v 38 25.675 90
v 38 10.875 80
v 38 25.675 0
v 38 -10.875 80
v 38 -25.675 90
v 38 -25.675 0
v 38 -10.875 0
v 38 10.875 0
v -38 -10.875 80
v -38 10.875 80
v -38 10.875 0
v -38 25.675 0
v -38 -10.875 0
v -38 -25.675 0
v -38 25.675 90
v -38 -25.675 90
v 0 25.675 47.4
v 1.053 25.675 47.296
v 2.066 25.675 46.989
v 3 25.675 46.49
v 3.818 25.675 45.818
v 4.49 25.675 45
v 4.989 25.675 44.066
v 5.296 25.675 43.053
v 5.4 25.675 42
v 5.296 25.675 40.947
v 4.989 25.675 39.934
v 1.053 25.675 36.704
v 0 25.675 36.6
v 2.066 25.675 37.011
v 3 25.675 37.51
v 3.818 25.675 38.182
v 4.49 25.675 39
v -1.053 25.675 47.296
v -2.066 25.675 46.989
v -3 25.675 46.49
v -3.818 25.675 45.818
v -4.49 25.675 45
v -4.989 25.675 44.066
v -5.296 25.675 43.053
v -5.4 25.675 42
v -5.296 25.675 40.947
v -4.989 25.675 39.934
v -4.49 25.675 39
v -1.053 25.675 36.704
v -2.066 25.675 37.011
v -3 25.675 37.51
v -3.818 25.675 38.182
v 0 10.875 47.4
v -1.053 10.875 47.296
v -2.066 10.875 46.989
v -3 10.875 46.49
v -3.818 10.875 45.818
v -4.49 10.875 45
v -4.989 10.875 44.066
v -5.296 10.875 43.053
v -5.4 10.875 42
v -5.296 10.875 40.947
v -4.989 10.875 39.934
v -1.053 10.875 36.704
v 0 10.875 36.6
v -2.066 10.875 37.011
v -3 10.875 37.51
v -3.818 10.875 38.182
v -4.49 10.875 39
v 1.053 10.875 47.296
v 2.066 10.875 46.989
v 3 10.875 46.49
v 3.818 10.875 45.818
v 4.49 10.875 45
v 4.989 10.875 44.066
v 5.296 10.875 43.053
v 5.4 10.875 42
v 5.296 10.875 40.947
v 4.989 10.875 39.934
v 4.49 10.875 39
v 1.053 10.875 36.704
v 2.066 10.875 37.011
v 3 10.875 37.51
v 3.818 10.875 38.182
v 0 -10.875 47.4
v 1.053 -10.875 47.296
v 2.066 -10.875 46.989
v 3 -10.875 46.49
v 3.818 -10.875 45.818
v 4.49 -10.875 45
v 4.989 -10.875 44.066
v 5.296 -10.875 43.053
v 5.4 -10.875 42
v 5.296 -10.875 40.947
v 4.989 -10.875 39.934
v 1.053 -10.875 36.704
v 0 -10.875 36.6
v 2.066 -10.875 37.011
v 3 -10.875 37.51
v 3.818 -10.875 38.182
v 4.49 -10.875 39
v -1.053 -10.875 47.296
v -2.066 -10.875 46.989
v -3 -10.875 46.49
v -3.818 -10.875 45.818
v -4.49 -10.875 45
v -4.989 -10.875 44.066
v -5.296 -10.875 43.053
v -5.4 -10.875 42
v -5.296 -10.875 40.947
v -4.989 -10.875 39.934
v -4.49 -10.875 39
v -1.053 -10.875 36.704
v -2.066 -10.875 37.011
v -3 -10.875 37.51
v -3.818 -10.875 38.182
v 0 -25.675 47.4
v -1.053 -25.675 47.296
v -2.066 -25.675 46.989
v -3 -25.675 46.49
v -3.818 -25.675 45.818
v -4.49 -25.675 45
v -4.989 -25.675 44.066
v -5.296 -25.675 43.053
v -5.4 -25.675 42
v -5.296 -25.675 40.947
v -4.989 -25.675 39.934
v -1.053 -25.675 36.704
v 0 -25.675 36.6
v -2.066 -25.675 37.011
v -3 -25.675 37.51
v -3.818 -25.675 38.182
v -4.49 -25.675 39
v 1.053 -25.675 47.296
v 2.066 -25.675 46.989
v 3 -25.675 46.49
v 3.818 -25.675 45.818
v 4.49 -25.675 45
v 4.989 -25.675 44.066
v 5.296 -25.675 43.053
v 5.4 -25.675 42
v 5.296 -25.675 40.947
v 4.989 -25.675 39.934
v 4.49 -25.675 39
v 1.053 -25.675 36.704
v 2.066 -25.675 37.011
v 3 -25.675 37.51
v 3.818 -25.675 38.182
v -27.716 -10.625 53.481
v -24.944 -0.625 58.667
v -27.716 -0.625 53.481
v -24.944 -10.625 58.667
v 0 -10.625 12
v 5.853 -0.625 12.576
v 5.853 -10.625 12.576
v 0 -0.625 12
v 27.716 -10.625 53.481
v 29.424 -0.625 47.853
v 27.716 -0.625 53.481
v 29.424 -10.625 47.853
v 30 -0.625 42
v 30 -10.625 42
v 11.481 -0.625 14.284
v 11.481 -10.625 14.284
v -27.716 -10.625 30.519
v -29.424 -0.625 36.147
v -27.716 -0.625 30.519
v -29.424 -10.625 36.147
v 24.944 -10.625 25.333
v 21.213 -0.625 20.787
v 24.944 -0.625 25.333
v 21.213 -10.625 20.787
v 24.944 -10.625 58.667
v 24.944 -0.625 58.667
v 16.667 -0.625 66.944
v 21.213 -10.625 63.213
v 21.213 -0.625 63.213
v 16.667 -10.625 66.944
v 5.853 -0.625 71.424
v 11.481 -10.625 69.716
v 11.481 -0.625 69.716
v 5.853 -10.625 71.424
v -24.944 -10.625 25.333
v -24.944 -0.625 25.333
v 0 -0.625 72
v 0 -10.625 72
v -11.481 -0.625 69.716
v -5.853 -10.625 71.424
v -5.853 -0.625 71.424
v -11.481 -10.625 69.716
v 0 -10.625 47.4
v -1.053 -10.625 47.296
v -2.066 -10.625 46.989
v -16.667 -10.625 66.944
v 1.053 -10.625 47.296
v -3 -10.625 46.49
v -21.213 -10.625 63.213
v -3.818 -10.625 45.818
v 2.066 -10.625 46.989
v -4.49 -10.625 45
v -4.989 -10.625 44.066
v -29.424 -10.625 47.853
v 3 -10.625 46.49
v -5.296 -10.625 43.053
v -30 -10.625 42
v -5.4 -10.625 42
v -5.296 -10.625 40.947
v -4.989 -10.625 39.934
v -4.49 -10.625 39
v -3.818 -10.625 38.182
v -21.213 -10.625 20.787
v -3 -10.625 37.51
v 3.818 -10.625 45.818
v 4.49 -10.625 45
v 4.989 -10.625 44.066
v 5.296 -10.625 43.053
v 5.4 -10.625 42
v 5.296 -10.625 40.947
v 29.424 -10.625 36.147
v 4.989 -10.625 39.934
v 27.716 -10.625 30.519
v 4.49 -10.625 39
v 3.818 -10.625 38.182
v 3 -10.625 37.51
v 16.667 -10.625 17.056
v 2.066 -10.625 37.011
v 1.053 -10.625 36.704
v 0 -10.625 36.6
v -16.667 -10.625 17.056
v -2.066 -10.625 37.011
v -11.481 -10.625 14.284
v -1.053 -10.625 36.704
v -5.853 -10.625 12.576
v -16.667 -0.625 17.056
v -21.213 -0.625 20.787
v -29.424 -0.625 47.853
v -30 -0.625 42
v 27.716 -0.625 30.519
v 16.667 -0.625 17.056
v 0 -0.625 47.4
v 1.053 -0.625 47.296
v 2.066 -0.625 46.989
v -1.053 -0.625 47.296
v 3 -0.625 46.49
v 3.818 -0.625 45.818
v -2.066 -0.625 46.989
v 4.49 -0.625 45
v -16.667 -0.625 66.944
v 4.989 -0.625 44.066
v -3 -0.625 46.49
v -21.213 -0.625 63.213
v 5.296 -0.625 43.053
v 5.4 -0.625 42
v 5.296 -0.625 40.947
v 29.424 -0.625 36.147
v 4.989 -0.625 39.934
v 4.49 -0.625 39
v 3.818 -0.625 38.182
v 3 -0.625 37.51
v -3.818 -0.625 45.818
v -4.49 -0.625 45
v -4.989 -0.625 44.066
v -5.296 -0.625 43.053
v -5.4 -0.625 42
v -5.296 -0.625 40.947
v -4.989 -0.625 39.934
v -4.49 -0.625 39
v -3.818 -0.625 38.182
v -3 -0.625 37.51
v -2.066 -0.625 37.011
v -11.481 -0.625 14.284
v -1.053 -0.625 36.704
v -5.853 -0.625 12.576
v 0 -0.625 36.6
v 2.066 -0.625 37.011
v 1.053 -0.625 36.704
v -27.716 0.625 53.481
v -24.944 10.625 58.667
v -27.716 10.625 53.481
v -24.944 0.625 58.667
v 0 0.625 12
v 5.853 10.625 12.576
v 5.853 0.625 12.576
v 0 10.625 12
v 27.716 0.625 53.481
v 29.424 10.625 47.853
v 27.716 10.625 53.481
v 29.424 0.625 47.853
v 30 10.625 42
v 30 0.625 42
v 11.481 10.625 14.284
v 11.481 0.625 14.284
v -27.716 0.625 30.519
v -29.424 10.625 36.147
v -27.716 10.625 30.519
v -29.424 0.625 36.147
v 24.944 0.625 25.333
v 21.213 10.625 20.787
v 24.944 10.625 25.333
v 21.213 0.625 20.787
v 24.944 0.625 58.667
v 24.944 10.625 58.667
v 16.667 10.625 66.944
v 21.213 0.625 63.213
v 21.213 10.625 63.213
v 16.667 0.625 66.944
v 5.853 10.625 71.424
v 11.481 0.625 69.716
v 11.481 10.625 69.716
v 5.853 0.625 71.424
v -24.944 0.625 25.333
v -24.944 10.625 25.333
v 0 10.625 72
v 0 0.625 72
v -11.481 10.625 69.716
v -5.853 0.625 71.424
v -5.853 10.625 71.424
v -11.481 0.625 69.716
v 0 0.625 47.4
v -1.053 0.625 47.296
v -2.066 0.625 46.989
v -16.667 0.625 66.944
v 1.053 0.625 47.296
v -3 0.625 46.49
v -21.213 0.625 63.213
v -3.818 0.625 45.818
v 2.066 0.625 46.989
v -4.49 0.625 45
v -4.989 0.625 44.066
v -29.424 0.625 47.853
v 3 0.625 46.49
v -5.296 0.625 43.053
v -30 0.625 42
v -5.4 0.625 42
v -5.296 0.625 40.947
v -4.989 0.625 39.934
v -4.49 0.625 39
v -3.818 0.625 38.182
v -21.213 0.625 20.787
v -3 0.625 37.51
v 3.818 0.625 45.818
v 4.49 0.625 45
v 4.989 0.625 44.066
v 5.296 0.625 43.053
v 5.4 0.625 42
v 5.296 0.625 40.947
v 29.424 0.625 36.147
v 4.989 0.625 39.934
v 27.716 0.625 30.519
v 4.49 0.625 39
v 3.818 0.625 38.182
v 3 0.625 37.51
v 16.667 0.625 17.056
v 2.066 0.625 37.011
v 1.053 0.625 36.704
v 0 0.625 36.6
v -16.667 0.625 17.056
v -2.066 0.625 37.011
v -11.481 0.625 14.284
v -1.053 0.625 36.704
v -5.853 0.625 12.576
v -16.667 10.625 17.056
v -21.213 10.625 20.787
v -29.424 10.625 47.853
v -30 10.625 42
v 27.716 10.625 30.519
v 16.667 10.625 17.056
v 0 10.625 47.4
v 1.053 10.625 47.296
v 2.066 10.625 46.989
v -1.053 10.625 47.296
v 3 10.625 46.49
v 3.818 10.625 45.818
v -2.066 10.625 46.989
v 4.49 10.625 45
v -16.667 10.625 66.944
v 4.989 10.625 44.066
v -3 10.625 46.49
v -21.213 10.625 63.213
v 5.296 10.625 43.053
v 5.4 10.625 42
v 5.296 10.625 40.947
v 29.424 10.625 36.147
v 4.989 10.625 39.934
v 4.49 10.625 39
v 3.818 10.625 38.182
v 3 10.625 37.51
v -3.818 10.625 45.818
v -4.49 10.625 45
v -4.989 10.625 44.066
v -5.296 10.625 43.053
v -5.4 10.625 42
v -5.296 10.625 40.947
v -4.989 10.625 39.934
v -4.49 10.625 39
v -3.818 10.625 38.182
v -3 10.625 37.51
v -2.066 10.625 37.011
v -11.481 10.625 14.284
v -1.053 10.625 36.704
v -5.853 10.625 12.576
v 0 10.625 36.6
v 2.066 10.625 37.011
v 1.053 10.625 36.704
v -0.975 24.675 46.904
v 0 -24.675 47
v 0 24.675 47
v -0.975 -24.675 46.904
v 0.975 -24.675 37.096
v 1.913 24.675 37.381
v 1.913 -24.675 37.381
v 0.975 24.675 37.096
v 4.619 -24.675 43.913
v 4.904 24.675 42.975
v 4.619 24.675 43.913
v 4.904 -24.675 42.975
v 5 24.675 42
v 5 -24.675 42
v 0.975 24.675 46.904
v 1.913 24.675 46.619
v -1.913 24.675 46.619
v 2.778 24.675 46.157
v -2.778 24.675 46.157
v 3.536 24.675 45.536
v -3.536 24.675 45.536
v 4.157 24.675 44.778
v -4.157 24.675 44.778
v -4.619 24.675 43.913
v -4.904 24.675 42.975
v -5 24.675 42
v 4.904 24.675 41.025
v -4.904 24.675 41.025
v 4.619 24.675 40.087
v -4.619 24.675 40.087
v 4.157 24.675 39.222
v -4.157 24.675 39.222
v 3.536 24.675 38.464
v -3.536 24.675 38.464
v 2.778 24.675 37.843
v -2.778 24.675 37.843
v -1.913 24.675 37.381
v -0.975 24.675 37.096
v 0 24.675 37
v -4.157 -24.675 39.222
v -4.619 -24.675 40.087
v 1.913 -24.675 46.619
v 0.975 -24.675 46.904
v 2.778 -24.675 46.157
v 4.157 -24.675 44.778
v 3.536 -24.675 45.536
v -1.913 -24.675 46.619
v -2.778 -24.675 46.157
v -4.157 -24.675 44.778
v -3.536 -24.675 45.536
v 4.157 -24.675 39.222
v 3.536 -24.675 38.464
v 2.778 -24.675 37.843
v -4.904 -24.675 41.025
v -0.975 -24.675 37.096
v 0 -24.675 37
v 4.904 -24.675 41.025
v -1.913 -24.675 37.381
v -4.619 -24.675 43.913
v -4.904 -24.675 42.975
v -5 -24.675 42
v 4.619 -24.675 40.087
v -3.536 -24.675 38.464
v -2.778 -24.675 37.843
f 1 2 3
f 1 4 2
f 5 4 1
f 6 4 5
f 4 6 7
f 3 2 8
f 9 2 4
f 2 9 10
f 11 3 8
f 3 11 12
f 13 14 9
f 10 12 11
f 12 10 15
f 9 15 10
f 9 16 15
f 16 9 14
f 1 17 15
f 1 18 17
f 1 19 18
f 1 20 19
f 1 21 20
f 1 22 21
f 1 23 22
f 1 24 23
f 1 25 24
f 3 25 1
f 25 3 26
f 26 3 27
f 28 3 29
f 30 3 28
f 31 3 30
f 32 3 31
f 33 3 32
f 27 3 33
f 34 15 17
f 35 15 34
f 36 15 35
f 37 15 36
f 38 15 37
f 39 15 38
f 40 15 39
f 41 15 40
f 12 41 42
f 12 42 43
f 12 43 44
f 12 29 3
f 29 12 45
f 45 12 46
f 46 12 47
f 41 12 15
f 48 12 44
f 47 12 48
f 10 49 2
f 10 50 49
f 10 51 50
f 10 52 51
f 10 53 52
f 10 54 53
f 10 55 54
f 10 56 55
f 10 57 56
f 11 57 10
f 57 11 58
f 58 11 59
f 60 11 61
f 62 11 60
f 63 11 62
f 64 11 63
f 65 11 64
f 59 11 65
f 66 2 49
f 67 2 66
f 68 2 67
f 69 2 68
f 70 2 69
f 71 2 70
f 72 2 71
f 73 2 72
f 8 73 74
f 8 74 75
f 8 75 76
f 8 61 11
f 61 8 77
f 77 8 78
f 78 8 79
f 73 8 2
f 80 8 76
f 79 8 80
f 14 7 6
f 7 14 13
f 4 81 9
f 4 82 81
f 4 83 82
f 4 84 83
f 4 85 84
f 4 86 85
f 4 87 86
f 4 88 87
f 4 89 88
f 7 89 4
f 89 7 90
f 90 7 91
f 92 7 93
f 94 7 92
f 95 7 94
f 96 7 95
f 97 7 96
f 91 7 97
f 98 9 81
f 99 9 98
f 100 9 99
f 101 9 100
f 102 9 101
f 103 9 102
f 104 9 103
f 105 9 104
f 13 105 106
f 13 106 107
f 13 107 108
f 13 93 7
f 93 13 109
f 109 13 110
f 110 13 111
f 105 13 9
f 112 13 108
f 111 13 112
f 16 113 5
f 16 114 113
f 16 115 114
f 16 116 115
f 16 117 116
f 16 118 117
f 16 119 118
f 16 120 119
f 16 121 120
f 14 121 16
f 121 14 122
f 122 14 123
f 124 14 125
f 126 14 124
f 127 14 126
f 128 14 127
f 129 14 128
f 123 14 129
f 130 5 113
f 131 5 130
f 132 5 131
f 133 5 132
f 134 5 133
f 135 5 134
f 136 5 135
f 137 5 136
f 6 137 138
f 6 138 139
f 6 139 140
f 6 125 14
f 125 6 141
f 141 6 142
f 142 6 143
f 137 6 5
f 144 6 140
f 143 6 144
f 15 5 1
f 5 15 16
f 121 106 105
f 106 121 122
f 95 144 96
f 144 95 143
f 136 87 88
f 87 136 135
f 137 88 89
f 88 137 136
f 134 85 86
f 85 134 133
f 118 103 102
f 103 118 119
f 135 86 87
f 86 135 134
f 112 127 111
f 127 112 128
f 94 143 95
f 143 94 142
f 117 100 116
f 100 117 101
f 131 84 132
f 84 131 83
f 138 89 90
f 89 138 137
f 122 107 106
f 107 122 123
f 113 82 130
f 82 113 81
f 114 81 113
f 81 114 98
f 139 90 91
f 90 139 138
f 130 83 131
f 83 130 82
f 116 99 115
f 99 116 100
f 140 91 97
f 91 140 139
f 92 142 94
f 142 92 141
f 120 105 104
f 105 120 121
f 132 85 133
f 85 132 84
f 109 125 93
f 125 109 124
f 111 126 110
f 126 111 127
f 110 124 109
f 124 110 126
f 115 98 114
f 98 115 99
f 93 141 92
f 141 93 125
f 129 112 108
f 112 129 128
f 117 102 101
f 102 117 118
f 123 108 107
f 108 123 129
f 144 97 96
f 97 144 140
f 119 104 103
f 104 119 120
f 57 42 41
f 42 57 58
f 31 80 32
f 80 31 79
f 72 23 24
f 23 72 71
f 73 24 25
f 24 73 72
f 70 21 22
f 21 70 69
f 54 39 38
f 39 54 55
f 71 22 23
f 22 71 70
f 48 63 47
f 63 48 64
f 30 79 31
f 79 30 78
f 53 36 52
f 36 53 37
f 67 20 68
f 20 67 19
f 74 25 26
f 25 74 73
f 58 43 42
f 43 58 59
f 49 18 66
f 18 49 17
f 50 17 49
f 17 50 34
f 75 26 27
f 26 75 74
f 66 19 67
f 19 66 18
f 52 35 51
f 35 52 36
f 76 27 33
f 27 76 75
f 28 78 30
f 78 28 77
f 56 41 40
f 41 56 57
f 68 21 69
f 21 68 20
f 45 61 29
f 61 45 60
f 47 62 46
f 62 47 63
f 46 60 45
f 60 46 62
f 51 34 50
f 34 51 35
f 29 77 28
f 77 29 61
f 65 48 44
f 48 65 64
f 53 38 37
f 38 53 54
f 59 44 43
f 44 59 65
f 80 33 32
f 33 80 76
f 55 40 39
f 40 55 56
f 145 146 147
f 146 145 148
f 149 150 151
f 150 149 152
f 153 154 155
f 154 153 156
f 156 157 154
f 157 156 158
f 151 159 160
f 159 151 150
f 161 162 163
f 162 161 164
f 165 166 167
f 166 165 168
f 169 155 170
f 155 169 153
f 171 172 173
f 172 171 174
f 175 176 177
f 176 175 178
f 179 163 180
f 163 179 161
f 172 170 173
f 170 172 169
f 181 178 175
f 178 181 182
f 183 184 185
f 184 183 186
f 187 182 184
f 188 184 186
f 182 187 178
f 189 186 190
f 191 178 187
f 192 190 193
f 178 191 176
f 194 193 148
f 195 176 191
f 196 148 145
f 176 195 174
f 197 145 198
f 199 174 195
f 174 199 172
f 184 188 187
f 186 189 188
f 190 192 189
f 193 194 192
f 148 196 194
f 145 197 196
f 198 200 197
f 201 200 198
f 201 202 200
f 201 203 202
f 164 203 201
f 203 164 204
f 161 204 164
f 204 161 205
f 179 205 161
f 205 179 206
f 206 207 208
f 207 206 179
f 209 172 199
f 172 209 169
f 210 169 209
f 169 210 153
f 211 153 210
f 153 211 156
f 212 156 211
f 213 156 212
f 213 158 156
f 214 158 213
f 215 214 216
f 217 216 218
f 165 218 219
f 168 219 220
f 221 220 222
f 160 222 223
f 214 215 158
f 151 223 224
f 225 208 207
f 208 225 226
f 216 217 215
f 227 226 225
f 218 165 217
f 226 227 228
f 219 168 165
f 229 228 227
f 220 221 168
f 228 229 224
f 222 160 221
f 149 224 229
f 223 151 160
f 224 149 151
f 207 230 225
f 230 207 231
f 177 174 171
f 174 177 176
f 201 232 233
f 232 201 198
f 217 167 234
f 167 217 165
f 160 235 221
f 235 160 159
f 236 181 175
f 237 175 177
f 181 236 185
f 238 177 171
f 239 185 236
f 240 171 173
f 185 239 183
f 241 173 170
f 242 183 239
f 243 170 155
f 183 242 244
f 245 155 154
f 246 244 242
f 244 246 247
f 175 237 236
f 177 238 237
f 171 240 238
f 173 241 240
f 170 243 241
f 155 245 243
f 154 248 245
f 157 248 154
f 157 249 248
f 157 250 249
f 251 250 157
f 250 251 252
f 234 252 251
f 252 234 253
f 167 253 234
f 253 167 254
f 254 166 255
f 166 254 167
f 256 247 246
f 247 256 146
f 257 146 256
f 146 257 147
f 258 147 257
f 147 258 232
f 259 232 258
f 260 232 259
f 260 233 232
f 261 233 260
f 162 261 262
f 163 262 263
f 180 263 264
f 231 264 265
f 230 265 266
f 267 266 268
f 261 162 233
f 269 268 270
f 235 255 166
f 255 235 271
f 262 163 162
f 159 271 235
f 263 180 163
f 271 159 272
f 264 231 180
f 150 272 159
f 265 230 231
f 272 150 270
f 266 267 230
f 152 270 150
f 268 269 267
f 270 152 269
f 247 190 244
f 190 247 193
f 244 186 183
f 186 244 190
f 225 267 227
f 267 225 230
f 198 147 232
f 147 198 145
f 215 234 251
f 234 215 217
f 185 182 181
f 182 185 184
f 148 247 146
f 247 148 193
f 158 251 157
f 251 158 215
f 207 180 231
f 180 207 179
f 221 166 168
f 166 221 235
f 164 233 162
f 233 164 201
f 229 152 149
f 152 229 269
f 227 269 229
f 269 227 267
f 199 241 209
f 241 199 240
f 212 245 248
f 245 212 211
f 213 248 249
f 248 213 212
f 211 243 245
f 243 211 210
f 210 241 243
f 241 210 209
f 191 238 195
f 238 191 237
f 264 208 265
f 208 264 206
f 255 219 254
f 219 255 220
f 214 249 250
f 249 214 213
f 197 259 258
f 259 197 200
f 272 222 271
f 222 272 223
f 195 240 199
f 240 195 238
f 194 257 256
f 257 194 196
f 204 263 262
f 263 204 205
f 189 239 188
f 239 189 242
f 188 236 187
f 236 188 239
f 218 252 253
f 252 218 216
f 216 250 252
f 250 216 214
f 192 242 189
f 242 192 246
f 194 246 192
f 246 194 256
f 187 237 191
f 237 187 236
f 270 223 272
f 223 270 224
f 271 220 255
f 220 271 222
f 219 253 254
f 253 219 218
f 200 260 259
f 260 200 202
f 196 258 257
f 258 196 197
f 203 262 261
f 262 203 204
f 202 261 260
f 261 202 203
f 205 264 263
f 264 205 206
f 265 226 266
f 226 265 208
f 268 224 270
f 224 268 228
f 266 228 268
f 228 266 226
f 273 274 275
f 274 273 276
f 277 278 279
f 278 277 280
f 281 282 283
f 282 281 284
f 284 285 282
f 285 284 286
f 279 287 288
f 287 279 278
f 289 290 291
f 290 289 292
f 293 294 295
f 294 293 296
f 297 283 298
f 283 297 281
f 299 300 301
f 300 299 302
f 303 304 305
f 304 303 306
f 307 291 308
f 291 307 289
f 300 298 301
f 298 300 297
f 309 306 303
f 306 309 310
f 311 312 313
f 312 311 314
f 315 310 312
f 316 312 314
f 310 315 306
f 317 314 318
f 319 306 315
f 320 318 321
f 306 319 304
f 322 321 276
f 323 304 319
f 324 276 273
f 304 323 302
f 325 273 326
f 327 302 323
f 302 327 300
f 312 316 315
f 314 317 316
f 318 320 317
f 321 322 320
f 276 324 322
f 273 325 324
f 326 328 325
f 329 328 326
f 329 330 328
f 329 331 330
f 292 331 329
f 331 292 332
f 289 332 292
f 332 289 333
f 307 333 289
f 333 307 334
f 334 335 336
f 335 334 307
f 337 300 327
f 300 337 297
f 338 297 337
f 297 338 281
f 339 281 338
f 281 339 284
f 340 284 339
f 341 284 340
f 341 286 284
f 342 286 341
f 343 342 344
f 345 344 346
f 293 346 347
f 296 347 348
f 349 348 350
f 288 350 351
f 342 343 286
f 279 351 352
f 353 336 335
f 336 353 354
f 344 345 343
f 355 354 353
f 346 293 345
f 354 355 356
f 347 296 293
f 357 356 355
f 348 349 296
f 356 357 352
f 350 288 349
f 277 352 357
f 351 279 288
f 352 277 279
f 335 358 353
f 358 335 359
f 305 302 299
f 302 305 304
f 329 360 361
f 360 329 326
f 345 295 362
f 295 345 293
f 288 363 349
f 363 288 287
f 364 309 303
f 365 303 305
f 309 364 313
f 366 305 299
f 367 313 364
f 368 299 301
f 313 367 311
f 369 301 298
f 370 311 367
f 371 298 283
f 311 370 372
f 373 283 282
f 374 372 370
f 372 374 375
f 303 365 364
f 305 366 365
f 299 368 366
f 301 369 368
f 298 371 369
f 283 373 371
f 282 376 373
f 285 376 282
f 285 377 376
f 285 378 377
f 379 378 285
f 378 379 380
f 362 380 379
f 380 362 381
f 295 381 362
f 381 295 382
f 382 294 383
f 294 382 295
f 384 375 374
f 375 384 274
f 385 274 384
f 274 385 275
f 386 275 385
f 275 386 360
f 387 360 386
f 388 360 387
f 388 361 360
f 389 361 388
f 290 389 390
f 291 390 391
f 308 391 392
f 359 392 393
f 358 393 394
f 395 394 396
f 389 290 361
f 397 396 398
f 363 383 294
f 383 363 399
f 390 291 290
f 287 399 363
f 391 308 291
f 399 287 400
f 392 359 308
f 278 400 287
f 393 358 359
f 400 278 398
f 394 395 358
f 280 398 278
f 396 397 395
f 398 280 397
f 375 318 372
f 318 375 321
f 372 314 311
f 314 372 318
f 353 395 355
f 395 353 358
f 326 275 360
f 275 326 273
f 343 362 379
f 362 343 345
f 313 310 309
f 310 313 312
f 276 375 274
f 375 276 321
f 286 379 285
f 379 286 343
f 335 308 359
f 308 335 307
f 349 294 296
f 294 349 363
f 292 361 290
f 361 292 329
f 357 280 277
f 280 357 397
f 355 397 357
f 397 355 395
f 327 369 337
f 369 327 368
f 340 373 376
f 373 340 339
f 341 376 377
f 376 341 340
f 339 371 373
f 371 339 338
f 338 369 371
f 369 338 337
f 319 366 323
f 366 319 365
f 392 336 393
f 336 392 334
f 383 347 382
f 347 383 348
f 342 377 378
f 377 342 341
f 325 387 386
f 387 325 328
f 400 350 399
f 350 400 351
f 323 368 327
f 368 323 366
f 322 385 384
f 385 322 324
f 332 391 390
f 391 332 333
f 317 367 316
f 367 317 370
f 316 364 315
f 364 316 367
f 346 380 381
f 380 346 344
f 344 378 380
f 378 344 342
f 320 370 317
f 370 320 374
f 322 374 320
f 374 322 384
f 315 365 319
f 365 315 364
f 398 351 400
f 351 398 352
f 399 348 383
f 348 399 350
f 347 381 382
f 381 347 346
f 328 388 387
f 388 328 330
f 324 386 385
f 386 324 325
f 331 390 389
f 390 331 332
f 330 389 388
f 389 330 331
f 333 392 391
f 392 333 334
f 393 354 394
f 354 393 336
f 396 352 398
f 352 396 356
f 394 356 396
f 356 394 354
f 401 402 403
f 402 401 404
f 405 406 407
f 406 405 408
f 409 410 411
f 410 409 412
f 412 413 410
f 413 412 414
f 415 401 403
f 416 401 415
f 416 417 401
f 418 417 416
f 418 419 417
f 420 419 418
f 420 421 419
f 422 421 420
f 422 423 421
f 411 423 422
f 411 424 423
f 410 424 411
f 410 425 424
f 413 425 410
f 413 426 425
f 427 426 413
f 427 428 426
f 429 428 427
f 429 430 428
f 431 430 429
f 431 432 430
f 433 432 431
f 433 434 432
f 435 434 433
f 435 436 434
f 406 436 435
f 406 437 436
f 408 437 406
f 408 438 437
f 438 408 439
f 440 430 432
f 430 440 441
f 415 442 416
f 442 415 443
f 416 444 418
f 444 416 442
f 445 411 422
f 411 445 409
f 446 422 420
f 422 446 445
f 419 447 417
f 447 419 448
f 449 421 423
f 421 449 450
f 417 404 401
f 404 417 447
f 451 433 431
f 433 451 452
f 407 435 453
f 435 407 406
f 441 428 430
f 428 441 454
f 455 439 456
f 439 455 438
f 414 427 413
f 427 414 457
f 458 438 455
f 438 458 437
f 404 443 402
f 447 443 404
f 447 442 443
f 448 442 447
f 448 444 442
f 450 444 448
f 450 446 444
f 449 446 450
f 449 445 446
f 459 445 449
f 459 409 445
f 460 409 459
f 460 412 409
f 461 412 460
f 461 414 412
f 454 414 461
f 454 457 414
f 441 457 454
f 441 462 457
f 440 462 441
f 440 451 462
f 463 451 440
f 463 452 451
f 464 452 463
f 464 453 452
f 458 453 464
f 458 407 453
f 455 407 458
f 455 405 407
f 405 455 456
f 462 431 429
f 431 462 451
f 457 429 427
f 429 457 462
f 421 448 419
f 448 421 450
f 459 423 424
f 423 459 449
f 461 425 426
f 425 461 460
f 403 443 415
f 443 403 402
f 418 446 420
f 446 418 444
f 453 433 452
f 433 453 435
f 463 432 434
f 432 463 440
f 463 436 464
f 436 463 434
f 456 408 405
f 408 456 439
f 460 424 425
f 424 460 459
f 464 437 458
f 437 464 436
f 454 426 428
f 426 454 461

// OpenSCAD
$fn = 32;

// ------------------------------------------------------------------------
// Trolley wheel set: wheels d60, fork 80 mm tall
// Every part is its own module, assembly() places every instance.
// ------------------------------------------------------------------------

// --- part 1 ---
module trolley_fork() {
  difference() {
    union() {
      translate([-38, 10.875, 0]) cube([76, 14.8, 80]);
      translate([-38, -25.675, 0]) cube([76, 14.8, 80]);
      translate([-38, -25.675, 80]) cube([76, 51.35, 10]);
    }
    translate([0, -18.275, 42]) rotate([90, 0, 0]) cylinder(h = 16.8, d = 10.8, center = true);
    translate([0, 18.275, 42]) rotate([90, 0, 0]) cylinder(h = 16.8, d = 10.8, center = true);
  }
}

// --- part 2 ---
module trolley_wheel() {
  difference() {
      translate([0, 0, 0]) cylinder(h = 10, d = 60);
      translate([0, 0, -1]) cylinder(h = 12, d = 10.8);
    }
}

// --- part 3 ---
module trolley_axle() {
  translate([0, 0, -24.675]) cylinder(h = 49.35, d = 10);
}

// --- assembly ---
module assembly() {
  color([0.80, 0.24, 0.20]) translate([0, 0, 0]) rotate([0, 0, 0]) trolley_fork();
  color([0.20, 0.45, 0.75]) translate([0, -0.625, 42]) rotate([90, 0, 0]) trolley_wheel();
  color([0.25, 0.62, 0.32]) translate([0, 10.625, 42]) rotate([90, 0, 0]) trolley_wheel();
  color([0.92, 0.70, 0.18]) translate([0, 0, 42]) rotate([90, 0, 0]) trolley_axle();
}

assembly();
